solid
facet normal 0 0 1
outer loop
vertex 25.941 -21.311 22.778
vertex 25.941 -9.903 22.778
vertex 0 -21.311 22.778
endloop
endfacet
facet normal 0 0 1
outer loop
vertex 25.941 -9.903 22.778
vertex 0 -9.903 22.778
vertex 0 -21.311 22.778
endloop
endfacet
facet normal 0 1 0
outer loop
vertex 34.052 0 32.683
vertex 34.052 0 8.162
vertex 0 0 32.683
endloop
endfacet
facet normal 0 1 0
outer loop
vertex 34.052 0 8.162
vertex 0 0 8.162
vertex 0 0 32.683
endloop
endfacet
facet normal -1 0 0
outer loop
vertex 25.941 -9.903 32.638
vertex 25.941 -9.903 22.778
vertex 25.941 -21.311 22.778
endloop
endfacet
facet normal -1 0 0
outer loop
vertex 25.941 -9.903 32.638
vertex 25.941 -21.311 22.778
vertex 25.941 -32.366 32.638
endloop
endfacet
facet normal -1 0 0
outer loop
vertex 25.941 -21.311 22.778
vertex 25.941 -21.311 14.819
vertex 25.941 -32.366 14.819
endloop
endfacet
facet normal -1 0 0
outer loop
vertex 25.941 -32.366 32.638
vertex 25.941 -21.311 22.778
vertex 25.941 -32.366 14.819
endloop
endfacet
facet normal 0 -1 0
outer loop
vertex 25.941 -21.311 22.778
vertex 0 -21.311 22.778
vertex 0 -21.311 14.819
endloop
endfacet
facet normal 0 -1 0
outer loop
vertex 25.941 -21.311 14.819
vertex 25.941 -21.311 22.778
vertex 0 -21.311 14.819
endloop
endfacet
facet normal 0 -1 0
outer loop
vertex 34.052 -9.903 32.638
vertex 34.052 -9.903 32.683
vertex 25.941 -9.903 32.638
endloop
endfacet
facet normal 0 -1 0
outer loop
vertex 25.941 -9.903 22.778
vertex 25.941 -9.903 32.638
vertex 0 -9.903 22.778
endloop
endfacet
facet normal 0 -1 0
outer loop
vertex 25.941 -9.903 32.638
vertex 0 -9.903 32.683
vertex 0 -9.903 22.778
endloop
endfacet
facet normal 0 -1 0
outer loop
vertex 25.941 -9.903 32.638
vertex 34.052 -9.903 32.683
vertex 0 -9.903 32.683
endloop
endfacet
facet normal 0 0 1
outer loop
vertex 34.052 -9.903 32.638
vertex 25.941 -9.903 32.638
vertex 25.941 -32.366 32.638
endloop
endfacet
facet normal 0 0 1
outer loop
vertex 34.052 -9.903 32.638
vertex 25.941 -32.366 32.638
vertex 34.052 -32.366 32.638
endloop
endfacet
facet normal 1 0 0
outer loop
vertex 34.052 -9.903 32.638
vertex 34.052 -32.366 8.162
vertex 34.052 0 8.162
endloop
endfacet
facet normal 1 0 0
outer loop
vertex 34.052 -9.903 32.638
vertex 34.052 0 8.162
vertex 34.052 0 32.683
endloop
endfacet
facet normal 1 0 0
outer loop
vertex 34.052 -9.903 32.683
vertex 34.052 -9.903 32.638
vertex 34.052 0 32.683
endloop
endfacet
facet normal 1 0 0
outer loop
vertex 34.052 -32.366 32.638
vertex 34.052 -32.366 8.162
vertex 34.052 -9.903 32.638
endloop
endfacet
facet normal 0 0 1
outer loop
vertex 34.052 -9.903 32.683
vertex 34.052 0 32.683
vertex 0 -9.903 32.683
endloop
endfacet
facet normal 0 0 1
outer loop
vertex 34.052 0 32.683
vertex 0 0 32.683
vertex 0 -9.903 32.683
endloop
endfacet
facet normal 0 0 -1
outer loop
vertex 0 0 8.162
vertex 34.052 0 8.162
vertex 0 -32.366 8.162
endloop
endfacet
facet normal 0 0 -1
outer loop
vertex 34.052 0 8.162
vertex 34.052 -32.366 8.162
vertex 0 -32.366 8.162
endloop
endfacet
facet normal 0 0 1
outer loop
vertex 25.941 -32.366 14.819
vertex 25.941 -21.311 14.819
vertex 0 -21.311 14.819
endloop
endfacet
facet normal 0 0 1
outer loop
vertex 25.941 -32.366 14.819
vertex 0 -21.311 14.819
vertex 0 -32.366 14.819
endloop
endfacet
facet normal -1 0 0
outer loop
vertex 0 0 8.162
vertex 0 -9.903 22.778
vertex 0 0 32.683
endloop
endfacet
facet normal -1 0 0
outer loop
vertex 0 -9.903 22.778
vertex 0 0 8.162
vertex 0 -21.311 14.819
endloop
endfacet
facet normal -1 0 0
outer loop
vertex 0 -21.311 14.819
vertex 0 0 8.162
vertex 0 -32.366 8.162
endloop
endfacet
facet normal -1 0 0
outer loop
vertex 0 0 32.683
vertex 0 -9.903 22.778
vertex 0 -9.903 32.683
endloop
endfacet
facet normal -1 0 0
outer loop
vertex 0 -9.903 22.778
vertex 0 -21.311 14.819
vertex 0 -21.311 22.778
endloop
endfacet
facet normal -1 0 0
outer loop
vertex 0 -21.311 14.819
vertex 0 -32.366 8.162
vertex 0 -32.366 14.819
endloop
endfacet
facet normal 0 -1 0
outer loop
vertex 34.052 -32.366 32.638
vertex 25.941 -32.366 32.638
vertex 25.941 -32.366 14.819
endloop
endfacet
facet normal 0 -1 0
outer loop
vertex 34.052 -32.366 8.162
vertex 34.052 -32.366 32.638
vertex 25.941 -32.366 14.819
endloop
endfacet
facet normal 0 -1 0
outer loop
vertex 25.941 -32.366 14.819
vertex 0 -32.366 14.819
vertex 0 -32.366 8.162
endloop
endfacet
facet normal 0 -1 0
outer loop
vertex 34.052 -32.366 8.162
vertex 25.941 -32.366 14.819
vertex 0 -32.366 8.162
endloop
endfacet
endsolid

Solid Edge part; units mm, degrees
sketch "Sketch1" plane through (0, 0, 0) normal (-1, 0, 0) x (0, -1, 0)
  line L0 (9.9031, 22.7779) -> (21.3114, 22.7779)
  line L1 (21.3114, 22.7779) -> (21.3114, 14.8186)
  line L2 (21.3114, 14.8186) -> (32.366, 14.8186)
  line L3 (32.366, 14.8186) -> (32.366, 0)
  line L4 (32.366, 0) -> (0, 0)
  line L5 (0, 0) -> (0, 32.6828)
  line L6 (0, 32.6828) -> (9.9031, 32.6828)
  line L7 (9.9031, 32.6828) -> (9.9031, 22.7779)
extrude "Protrusion1" add sketch "Sketch1" against normal blind 34.0516
sketch "Sketch2" plane through (17.0258, -26.8387, 14.8186) normal (0, 0, 1) x (0, -1, 0)
  line L0 (5.5273, 8.9153) -> (5.5273, 17.0258)
  line L1 (5.5273, 17.0258) -> (-26.8387, 17.0258)
  line L2 (-26.8387, 17.0258) -> (-26.8387, 8.9153)
  line L3 (-26.8387, 8.9153) -> (5.5273, 8.9153)
extrude "ExtrudedProtrusion_2" add sketch "Sketch2" along normal blind 17.8195
sketch "Sketch3" plane through (17.0258, -32.366, 16.319) normal (0, -1, 0) x (1, 0, 0)
  line L0 (17.0258, -8.1568) -> (-17.0258, -8.1568)
  line L1 (-17.0258, -8.1568) -> (-17.0258, -16.319)
  line L2 (-17.0258, -16.319) -> (17.0258, -16.319)
  line L3 (17.0258, -16.319) -> (17.0258, -8.1568)
extrude "ExtrudedCutout_1" cut sketch "Sketch3" against normal blind 75.3715
